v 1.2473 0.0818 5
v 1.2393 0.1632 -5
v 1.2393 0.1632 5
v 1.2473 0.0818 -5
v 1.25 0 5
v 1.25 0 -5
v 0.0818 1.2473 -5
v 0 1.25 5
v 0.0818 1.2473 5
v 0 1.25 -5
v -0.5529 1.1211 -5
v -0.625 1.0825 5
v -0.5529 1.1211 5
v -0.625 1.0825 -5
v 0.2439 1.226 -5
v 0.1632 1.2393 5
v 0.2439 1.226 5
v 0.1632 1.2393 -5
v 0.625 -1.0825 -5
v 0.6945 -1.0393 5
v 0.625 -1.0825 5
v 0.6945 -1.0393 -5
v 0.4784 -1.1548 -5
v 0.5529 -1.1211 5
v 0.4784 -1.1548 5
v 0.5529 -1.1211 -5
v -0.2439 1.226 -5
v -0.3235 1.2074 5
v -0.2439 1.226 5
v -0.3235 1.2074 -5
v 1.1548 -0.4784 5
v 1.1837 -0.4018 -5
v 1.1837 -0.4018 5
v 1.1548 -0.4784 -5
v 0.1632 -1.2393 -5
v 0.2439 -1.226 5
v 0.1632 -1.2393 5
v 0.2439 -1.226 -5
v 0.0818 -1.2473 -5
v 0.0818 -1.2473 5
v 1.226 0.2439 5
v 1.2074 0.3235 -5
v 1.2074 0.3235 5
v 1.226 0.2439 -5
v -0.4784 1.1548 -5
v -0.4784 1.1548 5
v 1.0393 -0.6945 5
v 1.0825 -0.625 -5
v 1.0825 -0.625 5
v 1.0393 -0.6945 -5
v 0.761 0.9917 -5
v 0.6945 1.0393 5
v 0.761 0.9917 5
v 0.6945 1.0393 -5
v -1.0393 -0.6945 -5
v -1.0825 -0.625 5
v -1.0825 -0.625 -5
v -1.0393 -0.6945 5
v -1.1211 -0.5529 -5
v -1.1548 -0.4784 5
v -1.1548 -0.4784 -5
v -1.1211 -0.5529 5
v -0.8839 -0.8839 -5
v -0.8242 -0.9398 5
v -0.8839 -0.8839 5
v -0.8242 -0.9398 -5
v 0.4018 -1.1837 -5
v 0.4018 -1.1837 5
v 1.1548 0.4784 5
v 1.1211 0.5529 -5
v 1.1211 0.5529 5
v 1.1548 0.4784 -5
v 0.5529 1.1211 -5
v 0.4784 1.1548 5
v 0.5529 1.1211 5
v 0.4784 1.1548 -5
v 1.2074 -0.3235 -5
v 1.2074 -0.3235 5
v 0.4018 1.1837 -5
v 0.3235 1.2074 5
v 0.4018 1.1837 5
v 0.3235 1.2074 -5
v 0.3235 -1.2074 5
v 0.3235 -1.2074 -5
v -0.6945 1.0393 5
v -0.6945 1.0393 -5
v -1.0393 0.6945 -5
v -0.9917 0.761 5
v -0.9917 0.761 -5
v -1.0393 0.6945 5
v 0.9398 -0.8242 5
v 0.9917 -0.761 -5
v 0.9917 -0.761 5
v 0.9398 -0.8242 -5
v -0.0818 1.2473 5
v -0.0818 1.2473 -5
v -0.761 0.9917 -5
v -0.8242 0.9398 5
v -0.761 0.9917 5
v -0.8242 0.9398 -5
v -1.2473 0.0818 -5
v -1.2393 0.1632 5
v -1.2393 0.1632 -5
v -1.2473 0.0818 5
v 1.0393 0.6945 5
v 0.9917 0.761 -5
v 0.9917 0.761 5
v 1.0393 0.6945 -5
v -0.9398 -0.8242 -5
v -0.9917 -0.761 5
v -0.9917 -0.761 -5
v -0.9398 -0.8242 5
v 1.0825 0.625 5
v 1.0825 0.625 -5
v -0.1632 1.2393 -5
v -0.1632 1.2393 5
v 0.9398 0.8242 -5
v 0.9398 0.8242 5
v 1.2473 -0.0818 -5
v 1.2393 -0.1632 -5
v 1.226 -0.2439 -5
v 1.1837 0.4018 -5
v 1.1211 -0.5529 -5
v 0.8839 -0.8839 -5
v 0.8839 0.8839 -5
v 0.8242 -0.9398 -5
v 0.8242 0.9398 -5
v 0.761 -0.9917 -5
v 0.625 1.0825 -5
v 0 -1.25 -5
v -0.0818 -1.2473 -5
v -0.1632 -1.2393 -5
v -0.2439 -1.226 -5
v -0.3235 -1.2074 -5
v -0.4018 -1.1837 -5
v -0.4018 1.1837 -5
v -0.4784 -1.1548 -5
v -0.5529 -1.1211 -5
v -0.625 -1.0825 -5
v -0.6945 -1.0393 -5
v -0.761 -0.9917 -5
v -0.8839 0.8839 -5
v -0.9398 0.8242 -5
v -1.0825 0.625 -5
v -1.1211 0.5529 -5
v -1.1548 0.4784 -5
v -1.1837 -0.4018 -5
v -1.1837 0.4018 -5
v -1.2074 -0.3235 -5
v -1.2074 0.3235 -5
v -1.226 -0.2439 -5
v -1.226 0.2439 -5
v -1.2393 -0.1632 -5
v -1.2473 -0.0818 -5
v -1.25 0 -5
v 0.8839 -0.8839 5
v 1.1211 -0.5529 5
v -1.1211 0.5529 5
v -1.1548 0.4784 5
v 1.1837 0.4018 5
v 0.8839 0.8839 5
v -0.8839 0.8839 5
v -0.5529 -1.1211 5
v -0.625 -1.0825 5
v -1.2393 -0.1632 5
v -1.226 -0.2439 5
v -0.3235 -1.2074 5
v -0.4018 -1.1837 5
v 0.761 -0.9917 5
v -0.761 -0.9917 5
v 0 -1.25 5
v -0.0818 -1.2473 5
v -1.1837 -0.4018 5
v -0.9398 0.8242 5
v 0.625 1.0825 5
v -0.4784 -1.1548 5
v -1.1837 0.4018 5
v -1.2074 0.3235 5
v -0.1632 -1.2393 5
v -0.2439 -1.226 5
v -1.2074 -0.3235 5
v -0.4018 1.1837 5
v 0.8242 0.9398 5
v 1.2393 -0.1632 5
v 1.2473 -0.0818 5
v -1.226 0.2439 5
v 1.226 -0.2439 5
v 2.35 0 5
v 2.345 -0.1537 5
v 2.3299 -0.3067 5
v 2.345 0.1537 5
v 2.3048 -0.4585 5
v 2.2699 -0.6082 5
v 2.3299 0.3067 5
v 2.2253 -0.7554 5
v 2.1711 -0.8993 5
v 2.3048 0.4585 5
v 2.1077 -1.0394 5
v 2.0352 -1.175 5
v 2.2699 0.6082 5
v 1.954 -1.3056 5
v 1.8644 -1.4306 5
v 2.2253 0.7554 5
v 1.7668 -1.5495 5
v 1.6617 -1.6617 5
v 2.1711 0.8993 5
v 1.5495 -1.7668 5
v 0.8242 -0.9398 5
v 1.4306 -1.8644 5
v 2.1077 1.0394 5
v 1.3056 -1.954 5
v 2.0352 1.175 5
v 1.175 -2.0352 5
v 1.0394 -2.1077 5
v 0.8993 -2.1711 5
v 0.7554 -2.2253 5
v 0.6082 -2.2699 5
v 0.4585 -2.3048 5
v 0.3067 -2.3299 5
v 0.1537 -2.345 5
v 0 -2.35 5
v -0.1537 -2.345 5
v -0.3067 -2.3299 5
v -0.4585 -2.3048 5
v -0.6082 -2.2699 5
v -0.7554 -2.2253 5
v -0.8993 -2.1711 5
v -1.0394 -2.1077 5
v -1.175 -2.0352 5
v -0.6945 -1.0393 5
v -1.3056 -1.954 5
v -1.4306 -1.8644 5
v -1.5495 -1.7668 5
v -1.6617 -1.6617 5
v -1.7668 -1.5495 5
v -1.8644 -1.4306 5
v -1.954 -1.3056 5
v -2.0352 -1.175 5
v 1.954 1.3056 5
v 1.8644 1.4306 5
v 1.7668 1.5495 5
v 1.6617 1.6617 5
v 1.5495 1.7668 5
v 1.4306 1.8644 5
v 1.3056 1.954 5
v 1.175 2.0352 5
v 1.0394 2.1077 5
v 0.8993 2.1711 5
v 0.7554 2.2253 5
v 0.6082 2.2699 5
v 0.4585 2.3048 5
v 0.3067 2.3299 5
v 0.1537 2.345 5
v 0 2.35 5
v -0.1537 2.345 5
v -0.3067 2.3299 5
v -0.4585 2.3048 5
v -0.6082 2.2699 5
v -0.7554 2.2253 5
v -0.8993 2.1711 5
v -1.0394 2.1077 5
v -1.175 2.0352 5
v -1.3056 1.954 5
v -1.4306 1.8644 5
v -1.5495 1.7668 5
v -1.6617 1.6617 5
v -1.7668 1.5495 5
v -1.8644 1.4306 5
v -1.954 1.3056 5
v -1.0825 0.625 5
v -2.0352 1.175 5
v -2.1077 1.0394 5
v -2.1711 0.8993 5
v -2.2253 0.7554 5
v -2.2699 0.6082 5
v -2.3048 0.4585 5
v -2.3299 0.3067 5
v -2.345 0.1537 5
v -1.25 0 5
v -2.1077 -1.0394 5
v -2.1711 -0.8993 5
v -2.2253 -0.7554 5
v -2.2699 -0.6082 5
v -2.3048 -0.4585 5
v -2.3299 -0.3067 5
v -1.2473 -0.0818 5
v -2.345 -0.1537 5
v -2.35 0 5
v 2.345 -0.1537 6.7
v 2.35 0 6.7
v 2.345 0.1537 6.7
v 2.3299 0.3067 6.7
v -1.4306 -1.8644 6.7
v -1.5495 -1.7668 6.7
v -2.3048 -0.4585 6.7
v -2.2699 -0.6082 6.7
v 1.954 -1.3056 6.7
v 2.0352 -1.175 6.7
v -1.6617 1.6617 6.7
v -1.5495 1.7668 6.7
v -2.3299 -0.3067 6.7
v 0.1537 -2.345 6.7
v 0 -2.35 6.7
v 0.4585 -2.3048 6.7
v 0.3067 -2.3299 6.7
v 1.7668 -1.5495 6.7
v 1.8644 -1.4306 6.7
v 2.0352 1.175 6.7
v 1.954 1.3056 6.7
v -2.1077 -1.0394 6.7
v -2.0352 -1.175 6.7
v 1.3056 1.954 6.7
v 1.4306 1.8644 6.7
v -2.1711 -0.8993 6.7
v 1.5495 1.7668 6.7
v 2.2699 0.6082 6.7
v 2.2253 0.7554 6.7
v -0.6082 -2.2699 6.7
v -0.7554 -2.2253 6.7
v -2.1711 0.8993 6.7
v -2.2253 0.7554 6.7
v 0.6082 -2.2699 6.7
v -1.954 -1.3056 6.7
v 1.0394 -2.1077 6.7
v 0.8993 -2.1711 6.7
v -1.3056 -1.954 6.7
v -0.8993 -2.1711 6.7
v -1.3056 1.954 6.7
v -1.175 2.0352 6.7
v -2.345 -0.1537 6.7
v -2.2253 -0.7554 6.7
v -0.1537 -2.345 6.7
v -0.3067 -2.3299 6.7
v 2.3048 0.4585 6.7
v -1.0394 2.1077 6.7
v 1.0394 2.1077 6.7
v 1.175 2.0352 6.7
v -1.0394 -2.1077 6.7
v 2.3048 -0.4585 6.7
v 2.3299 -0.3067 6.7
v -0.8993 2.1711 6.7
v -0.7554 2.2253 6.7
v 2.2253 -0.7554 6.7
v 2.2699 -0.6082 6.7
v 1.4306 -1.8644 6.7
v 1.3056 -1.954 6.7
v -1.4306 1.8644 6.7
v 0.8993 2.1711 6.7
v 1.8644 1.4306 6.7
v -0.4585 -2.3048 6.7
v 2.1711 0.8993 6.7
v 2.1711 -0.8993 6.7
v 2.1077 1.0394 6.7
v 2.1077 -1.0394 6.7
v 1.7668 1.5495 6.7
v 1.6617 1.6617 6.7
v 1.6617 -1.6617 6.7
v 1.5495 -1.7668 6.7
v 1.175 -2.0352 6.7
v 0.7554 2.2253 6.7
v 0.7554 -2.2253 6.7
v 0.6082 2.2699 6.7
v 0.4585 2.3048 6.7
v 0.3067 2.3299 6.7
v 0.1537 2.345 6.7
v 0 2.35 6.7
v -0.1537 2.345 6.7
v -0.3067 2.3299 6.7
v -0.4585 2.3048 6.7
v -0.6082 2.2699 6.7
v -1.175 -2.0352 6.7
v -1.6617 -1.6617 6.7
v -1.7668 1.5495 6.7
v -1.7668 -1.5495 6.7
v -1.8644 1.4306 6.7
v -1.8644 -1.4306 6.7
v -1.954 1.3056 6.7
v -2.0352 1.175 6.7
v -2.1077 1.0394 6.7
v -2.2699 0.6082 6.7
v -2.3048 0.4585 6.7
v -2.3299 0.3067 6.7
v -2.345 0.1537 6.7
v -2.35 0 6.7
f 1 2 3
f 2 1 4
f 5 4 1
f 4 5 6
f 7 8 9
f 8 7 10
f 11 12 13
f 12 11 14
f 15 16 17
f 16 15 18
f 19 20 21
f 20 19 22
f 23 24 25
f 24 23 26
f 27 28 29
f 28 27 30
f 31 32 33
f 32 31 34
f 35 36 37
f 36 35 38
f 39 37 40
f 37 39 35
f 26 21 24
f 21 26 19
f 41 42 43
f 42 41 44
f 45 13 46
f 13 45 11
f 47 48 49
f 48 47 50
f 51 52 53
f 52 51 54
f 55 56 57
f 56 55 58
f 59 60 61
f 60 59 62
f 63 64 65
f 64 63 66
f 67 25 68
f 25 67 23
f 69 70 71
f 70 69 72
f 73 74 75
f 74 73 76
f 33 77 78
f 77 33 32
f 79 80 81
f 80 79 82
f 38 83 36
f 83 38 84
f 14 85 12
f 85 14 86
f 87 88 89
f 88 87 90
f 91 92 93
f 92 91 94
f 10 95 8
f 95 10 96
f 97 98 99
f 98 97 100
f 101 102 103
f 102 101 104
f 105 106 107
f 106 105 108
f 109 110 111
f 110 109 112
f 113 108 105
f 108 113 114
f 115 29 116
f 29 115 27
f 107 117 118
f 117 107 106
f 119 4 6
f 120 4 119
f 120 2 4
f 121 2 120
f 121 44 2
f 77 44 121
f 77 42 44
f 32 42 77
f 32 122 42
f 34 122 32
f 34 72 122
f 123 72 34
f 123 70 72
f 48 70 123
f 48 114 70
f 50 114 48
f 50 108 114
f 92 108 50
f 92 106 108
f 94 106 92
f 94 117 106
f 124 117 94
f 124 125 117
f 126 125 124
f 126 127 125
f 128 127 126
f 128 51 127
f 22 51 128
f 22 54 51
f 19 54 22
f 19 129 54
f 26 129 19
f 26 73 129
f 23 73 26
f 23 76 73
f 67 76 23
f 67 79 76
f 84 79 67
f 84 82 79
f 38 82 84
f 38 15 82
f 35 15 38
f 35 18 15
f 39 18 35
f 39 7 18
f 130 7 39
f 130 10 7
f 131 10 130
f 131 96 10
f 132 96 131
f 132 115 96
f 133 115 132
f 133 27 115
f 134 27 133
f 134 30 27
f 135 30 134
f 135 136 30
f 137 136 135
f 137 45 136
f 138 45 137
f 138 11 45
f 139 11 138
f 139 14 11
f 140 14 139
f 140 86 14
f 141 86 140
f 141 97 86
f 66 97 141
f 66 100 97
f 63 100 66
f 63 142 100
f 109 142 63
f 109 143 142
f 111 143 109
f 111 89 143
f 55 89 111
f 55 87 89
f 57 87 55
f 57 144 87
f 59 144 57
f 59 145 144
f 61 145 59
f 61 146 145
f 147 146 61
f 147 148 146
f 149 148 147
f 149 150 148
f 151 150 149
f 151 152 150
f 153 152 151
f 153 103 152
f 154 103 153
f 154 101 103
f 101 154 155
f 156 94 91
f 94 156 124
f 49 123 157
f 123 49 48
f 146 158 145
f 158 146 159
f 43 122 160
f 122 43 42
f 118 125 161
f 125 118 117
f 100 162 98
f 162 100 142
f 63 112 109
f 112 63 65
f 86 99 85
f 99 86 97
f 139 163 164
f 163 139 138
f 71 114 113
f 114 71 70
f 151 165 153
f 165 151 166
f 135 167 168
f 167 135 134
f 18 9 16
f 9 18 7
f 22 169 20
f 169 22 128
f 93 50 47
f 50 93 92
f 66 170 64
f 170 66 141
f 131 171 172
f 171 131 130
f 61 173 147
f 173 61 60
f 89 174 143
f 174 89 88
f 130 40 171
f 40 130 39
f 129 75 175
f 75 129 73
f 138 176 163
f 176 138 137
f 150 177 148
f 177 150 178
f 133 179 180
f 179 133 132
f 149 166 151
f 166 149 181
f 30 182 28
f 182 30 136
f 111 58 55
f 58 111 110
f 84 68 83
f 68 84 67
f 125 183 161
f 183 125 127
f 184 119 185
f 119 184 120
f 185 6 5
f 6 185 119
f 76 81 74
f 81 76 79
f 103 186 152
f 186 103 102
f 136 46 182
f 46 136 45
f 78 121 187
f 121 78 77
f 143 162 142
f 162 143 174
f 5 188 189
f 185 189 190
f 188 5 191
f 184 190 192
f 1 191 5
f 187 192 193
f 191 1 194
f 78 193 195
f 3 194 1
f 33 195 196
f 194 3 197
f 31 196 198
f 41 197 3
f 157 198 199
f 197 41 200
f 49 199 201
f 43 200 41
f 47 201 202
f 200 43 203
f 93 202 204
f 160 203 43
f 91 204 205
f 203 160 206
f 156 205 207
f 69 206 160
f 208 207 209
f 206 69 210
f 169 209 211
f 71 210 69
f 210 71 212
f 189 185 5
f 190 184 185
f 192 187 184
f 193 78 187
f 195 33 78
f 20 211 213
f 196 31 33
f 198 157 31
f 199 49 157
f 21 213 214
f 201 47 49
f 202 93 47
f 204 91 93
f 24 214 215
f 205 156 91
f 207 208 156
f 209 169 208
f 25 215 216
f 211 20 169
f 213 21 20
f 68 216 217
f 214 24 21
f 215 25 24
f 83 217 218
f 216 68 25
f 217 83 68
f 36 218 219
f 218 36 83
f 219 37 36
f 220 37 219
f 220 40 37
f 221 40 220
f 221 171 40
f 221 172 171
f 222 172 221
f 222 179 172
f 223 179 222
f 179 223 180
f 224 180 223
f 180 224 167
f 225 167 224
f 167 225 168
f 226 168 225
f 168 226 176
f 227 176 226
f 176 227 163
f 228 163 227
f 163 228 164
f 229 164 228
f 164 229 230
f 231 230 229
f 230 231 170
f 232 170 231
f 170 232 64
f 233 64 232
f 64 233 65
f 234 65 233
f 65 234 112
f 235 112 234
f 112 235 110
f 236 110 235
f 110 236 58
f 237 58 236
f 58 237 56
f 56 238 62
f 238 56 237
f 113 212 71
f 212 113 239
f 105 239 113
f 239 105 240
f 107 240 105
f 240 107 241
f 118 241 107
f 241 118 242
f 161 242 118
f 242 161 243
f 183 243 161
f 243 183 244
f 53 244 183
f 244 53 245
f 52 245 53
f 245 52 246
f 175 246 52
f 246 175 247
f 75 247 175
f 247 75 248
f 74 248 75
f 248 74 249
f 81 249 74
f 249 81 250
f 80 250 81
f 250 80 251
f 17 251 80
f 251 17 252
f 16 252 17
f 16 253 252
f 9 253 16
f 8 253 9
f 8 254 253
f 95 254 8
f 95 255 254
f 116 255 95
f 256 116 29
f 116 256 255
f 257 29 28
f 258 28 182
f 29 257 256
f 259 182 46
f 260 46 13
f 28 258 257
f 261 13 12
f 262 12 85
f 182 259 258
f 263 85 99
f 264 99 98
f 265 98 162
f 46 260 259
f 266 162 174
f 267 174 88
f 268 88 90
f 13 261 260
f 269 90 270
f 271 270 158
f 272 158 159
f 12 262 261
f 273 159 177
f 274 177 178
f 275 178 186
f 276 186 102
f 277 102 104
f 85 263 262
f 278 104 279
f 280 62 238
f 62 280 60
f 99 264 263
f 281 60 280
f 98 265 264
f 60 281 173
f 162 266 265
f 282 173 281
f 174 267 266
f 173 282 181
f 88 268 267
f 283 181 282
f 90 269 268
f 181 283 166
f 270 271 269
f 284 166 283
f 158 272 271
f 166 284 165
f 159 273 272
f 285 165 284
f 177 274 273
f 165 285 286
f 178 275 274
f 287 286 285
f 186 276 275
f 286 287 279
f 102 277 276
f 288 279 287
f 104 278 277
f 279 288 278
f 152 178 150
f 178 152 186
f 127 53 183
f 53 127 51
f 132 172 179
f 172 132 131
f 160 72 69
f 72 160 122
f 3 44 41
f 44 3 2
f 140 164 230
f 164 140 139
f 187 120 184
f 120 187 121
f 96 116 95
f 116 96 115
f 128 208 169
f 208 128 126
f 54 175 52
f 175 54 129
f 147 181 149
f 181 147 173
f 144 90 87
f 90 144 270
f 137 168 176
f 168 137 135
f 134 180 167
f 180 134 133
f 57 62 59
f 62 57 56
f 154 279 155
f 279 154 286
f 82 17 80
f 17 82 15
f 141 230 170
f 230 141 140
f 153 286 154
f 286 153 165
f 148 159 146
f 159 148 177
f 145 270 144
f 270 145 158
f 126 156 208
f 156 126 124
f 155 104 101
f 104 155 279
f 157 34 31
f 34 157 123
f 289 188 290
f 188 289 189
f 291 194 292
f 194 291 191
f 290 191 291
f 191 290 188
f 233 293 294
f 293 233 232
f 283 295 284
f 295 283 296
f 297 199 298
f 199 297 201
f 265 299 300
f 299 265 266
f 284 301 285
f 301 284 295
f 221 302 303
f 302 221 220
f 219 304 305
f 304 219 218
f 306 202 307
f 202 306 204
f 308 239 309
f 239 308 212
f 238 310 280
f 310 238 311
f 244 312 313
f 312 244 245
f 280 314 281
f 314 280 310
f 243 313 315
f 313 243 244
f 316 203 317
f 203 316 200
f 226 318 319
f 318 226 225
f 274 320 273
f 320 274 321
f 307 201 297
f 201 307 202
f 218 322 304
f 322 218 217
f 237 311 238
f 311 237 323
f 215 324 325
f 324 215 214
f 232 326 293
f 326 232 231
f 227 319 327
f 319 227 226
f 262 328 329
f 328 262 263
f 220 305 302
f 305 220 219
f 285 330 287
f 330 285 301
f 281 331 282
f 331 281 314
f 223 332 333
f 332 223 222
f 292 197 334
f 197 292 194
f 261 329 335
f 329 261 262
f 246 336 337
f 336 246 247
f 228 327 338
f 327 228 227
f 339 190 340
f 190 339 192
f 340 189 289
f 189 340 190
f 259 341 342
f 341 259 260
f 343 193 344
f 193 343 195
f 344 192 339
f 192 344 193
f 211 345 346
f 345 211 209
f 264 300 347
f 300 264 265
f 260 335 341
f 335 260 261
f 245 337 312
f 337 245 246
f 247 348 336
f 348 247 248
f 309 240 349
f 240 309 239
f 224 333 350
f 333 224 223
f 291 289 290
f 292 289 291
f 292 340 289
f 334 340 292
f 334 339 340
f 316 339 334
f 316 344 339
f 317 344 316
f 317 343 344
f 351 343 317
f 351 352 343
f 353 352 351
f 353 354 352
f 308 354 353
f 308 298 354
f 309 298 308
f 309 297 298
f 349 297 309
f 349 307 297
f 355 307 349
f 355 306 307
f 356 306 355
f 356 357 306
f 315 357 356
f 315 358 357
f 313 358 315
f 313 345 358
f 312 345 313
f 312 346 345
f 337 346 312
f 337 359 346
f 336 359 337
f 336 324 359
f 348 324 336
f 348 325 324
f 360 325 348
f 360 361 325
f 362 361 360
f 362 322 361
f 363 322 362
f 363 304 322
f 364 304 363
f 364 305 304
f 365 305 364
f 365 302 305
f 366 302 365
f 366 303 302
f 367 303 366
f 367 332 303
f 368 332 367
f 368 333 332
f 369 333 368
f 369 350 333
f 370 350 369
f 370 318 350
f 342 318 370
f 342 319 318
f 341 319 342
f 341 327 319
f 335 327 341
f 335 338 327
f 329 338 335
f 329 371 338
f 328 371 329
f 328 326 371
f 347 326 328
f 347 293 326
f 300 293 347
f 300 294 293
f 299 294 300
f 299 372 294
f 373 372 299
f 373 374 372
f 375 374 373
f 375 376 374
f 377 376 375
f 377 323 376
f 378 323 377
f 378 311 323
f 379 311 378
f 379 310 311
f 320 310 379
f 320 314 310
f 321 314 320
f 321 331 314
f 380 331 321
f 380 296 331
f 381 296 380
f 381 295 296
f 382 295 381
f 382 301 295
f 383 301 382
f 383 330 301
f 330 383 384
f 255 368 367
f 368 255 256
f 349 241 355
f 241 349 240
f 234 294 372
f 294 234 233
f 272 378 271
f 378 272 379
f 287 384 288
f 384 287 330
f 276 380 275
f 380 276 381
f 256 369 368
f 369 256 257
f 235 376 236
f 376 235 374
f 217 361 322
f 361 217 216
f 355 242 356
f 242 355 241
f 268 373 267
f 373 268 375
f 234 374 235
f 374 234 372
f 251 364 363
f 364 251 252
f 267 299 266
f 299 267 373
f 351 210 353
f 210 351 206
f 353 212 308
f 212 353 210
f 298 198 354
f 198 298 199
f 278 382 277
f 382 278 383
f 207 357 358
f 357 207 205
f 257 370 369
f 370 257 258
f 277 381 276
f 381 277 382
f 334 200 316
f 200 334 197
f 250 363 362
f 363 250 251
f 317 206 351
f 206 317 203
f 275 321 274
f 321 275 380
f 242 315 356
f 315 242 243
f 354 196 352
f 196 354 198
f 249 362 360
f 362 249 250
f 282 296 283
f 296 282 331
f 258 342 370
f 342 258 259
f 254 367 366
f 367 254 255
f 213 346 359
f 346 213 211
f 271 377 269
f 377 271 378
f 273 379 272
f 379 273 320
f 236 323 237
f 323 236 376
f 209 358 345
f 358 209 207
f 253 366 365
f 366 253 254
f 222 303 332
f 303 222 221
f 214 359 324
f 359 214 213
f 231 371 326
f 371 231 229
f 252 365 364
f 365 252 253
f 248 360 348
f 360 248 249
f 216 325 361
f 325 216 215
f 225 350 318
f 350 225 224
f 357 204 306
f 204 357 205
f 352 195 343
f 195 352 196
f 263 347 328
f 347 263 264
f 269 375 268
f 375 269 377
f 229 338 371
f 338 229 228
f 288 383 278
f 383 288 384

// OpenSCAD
$fn=96;

module pan_head_screw(shaft_d=2.5, length=10, head_d=4.7, head_h=1.7) {
    union() {
        translate([0,0,-length/2])
            cylinder(d=shaft_d, h=length, $fn=96);

        translate([0,0,length/2])
            cylinder(d=head_d, h=head_h, $fn=96);
    }
}

pan_head_screw(shaft_d=2.5, length=10, head_d=4.7, head_h=1.7);
